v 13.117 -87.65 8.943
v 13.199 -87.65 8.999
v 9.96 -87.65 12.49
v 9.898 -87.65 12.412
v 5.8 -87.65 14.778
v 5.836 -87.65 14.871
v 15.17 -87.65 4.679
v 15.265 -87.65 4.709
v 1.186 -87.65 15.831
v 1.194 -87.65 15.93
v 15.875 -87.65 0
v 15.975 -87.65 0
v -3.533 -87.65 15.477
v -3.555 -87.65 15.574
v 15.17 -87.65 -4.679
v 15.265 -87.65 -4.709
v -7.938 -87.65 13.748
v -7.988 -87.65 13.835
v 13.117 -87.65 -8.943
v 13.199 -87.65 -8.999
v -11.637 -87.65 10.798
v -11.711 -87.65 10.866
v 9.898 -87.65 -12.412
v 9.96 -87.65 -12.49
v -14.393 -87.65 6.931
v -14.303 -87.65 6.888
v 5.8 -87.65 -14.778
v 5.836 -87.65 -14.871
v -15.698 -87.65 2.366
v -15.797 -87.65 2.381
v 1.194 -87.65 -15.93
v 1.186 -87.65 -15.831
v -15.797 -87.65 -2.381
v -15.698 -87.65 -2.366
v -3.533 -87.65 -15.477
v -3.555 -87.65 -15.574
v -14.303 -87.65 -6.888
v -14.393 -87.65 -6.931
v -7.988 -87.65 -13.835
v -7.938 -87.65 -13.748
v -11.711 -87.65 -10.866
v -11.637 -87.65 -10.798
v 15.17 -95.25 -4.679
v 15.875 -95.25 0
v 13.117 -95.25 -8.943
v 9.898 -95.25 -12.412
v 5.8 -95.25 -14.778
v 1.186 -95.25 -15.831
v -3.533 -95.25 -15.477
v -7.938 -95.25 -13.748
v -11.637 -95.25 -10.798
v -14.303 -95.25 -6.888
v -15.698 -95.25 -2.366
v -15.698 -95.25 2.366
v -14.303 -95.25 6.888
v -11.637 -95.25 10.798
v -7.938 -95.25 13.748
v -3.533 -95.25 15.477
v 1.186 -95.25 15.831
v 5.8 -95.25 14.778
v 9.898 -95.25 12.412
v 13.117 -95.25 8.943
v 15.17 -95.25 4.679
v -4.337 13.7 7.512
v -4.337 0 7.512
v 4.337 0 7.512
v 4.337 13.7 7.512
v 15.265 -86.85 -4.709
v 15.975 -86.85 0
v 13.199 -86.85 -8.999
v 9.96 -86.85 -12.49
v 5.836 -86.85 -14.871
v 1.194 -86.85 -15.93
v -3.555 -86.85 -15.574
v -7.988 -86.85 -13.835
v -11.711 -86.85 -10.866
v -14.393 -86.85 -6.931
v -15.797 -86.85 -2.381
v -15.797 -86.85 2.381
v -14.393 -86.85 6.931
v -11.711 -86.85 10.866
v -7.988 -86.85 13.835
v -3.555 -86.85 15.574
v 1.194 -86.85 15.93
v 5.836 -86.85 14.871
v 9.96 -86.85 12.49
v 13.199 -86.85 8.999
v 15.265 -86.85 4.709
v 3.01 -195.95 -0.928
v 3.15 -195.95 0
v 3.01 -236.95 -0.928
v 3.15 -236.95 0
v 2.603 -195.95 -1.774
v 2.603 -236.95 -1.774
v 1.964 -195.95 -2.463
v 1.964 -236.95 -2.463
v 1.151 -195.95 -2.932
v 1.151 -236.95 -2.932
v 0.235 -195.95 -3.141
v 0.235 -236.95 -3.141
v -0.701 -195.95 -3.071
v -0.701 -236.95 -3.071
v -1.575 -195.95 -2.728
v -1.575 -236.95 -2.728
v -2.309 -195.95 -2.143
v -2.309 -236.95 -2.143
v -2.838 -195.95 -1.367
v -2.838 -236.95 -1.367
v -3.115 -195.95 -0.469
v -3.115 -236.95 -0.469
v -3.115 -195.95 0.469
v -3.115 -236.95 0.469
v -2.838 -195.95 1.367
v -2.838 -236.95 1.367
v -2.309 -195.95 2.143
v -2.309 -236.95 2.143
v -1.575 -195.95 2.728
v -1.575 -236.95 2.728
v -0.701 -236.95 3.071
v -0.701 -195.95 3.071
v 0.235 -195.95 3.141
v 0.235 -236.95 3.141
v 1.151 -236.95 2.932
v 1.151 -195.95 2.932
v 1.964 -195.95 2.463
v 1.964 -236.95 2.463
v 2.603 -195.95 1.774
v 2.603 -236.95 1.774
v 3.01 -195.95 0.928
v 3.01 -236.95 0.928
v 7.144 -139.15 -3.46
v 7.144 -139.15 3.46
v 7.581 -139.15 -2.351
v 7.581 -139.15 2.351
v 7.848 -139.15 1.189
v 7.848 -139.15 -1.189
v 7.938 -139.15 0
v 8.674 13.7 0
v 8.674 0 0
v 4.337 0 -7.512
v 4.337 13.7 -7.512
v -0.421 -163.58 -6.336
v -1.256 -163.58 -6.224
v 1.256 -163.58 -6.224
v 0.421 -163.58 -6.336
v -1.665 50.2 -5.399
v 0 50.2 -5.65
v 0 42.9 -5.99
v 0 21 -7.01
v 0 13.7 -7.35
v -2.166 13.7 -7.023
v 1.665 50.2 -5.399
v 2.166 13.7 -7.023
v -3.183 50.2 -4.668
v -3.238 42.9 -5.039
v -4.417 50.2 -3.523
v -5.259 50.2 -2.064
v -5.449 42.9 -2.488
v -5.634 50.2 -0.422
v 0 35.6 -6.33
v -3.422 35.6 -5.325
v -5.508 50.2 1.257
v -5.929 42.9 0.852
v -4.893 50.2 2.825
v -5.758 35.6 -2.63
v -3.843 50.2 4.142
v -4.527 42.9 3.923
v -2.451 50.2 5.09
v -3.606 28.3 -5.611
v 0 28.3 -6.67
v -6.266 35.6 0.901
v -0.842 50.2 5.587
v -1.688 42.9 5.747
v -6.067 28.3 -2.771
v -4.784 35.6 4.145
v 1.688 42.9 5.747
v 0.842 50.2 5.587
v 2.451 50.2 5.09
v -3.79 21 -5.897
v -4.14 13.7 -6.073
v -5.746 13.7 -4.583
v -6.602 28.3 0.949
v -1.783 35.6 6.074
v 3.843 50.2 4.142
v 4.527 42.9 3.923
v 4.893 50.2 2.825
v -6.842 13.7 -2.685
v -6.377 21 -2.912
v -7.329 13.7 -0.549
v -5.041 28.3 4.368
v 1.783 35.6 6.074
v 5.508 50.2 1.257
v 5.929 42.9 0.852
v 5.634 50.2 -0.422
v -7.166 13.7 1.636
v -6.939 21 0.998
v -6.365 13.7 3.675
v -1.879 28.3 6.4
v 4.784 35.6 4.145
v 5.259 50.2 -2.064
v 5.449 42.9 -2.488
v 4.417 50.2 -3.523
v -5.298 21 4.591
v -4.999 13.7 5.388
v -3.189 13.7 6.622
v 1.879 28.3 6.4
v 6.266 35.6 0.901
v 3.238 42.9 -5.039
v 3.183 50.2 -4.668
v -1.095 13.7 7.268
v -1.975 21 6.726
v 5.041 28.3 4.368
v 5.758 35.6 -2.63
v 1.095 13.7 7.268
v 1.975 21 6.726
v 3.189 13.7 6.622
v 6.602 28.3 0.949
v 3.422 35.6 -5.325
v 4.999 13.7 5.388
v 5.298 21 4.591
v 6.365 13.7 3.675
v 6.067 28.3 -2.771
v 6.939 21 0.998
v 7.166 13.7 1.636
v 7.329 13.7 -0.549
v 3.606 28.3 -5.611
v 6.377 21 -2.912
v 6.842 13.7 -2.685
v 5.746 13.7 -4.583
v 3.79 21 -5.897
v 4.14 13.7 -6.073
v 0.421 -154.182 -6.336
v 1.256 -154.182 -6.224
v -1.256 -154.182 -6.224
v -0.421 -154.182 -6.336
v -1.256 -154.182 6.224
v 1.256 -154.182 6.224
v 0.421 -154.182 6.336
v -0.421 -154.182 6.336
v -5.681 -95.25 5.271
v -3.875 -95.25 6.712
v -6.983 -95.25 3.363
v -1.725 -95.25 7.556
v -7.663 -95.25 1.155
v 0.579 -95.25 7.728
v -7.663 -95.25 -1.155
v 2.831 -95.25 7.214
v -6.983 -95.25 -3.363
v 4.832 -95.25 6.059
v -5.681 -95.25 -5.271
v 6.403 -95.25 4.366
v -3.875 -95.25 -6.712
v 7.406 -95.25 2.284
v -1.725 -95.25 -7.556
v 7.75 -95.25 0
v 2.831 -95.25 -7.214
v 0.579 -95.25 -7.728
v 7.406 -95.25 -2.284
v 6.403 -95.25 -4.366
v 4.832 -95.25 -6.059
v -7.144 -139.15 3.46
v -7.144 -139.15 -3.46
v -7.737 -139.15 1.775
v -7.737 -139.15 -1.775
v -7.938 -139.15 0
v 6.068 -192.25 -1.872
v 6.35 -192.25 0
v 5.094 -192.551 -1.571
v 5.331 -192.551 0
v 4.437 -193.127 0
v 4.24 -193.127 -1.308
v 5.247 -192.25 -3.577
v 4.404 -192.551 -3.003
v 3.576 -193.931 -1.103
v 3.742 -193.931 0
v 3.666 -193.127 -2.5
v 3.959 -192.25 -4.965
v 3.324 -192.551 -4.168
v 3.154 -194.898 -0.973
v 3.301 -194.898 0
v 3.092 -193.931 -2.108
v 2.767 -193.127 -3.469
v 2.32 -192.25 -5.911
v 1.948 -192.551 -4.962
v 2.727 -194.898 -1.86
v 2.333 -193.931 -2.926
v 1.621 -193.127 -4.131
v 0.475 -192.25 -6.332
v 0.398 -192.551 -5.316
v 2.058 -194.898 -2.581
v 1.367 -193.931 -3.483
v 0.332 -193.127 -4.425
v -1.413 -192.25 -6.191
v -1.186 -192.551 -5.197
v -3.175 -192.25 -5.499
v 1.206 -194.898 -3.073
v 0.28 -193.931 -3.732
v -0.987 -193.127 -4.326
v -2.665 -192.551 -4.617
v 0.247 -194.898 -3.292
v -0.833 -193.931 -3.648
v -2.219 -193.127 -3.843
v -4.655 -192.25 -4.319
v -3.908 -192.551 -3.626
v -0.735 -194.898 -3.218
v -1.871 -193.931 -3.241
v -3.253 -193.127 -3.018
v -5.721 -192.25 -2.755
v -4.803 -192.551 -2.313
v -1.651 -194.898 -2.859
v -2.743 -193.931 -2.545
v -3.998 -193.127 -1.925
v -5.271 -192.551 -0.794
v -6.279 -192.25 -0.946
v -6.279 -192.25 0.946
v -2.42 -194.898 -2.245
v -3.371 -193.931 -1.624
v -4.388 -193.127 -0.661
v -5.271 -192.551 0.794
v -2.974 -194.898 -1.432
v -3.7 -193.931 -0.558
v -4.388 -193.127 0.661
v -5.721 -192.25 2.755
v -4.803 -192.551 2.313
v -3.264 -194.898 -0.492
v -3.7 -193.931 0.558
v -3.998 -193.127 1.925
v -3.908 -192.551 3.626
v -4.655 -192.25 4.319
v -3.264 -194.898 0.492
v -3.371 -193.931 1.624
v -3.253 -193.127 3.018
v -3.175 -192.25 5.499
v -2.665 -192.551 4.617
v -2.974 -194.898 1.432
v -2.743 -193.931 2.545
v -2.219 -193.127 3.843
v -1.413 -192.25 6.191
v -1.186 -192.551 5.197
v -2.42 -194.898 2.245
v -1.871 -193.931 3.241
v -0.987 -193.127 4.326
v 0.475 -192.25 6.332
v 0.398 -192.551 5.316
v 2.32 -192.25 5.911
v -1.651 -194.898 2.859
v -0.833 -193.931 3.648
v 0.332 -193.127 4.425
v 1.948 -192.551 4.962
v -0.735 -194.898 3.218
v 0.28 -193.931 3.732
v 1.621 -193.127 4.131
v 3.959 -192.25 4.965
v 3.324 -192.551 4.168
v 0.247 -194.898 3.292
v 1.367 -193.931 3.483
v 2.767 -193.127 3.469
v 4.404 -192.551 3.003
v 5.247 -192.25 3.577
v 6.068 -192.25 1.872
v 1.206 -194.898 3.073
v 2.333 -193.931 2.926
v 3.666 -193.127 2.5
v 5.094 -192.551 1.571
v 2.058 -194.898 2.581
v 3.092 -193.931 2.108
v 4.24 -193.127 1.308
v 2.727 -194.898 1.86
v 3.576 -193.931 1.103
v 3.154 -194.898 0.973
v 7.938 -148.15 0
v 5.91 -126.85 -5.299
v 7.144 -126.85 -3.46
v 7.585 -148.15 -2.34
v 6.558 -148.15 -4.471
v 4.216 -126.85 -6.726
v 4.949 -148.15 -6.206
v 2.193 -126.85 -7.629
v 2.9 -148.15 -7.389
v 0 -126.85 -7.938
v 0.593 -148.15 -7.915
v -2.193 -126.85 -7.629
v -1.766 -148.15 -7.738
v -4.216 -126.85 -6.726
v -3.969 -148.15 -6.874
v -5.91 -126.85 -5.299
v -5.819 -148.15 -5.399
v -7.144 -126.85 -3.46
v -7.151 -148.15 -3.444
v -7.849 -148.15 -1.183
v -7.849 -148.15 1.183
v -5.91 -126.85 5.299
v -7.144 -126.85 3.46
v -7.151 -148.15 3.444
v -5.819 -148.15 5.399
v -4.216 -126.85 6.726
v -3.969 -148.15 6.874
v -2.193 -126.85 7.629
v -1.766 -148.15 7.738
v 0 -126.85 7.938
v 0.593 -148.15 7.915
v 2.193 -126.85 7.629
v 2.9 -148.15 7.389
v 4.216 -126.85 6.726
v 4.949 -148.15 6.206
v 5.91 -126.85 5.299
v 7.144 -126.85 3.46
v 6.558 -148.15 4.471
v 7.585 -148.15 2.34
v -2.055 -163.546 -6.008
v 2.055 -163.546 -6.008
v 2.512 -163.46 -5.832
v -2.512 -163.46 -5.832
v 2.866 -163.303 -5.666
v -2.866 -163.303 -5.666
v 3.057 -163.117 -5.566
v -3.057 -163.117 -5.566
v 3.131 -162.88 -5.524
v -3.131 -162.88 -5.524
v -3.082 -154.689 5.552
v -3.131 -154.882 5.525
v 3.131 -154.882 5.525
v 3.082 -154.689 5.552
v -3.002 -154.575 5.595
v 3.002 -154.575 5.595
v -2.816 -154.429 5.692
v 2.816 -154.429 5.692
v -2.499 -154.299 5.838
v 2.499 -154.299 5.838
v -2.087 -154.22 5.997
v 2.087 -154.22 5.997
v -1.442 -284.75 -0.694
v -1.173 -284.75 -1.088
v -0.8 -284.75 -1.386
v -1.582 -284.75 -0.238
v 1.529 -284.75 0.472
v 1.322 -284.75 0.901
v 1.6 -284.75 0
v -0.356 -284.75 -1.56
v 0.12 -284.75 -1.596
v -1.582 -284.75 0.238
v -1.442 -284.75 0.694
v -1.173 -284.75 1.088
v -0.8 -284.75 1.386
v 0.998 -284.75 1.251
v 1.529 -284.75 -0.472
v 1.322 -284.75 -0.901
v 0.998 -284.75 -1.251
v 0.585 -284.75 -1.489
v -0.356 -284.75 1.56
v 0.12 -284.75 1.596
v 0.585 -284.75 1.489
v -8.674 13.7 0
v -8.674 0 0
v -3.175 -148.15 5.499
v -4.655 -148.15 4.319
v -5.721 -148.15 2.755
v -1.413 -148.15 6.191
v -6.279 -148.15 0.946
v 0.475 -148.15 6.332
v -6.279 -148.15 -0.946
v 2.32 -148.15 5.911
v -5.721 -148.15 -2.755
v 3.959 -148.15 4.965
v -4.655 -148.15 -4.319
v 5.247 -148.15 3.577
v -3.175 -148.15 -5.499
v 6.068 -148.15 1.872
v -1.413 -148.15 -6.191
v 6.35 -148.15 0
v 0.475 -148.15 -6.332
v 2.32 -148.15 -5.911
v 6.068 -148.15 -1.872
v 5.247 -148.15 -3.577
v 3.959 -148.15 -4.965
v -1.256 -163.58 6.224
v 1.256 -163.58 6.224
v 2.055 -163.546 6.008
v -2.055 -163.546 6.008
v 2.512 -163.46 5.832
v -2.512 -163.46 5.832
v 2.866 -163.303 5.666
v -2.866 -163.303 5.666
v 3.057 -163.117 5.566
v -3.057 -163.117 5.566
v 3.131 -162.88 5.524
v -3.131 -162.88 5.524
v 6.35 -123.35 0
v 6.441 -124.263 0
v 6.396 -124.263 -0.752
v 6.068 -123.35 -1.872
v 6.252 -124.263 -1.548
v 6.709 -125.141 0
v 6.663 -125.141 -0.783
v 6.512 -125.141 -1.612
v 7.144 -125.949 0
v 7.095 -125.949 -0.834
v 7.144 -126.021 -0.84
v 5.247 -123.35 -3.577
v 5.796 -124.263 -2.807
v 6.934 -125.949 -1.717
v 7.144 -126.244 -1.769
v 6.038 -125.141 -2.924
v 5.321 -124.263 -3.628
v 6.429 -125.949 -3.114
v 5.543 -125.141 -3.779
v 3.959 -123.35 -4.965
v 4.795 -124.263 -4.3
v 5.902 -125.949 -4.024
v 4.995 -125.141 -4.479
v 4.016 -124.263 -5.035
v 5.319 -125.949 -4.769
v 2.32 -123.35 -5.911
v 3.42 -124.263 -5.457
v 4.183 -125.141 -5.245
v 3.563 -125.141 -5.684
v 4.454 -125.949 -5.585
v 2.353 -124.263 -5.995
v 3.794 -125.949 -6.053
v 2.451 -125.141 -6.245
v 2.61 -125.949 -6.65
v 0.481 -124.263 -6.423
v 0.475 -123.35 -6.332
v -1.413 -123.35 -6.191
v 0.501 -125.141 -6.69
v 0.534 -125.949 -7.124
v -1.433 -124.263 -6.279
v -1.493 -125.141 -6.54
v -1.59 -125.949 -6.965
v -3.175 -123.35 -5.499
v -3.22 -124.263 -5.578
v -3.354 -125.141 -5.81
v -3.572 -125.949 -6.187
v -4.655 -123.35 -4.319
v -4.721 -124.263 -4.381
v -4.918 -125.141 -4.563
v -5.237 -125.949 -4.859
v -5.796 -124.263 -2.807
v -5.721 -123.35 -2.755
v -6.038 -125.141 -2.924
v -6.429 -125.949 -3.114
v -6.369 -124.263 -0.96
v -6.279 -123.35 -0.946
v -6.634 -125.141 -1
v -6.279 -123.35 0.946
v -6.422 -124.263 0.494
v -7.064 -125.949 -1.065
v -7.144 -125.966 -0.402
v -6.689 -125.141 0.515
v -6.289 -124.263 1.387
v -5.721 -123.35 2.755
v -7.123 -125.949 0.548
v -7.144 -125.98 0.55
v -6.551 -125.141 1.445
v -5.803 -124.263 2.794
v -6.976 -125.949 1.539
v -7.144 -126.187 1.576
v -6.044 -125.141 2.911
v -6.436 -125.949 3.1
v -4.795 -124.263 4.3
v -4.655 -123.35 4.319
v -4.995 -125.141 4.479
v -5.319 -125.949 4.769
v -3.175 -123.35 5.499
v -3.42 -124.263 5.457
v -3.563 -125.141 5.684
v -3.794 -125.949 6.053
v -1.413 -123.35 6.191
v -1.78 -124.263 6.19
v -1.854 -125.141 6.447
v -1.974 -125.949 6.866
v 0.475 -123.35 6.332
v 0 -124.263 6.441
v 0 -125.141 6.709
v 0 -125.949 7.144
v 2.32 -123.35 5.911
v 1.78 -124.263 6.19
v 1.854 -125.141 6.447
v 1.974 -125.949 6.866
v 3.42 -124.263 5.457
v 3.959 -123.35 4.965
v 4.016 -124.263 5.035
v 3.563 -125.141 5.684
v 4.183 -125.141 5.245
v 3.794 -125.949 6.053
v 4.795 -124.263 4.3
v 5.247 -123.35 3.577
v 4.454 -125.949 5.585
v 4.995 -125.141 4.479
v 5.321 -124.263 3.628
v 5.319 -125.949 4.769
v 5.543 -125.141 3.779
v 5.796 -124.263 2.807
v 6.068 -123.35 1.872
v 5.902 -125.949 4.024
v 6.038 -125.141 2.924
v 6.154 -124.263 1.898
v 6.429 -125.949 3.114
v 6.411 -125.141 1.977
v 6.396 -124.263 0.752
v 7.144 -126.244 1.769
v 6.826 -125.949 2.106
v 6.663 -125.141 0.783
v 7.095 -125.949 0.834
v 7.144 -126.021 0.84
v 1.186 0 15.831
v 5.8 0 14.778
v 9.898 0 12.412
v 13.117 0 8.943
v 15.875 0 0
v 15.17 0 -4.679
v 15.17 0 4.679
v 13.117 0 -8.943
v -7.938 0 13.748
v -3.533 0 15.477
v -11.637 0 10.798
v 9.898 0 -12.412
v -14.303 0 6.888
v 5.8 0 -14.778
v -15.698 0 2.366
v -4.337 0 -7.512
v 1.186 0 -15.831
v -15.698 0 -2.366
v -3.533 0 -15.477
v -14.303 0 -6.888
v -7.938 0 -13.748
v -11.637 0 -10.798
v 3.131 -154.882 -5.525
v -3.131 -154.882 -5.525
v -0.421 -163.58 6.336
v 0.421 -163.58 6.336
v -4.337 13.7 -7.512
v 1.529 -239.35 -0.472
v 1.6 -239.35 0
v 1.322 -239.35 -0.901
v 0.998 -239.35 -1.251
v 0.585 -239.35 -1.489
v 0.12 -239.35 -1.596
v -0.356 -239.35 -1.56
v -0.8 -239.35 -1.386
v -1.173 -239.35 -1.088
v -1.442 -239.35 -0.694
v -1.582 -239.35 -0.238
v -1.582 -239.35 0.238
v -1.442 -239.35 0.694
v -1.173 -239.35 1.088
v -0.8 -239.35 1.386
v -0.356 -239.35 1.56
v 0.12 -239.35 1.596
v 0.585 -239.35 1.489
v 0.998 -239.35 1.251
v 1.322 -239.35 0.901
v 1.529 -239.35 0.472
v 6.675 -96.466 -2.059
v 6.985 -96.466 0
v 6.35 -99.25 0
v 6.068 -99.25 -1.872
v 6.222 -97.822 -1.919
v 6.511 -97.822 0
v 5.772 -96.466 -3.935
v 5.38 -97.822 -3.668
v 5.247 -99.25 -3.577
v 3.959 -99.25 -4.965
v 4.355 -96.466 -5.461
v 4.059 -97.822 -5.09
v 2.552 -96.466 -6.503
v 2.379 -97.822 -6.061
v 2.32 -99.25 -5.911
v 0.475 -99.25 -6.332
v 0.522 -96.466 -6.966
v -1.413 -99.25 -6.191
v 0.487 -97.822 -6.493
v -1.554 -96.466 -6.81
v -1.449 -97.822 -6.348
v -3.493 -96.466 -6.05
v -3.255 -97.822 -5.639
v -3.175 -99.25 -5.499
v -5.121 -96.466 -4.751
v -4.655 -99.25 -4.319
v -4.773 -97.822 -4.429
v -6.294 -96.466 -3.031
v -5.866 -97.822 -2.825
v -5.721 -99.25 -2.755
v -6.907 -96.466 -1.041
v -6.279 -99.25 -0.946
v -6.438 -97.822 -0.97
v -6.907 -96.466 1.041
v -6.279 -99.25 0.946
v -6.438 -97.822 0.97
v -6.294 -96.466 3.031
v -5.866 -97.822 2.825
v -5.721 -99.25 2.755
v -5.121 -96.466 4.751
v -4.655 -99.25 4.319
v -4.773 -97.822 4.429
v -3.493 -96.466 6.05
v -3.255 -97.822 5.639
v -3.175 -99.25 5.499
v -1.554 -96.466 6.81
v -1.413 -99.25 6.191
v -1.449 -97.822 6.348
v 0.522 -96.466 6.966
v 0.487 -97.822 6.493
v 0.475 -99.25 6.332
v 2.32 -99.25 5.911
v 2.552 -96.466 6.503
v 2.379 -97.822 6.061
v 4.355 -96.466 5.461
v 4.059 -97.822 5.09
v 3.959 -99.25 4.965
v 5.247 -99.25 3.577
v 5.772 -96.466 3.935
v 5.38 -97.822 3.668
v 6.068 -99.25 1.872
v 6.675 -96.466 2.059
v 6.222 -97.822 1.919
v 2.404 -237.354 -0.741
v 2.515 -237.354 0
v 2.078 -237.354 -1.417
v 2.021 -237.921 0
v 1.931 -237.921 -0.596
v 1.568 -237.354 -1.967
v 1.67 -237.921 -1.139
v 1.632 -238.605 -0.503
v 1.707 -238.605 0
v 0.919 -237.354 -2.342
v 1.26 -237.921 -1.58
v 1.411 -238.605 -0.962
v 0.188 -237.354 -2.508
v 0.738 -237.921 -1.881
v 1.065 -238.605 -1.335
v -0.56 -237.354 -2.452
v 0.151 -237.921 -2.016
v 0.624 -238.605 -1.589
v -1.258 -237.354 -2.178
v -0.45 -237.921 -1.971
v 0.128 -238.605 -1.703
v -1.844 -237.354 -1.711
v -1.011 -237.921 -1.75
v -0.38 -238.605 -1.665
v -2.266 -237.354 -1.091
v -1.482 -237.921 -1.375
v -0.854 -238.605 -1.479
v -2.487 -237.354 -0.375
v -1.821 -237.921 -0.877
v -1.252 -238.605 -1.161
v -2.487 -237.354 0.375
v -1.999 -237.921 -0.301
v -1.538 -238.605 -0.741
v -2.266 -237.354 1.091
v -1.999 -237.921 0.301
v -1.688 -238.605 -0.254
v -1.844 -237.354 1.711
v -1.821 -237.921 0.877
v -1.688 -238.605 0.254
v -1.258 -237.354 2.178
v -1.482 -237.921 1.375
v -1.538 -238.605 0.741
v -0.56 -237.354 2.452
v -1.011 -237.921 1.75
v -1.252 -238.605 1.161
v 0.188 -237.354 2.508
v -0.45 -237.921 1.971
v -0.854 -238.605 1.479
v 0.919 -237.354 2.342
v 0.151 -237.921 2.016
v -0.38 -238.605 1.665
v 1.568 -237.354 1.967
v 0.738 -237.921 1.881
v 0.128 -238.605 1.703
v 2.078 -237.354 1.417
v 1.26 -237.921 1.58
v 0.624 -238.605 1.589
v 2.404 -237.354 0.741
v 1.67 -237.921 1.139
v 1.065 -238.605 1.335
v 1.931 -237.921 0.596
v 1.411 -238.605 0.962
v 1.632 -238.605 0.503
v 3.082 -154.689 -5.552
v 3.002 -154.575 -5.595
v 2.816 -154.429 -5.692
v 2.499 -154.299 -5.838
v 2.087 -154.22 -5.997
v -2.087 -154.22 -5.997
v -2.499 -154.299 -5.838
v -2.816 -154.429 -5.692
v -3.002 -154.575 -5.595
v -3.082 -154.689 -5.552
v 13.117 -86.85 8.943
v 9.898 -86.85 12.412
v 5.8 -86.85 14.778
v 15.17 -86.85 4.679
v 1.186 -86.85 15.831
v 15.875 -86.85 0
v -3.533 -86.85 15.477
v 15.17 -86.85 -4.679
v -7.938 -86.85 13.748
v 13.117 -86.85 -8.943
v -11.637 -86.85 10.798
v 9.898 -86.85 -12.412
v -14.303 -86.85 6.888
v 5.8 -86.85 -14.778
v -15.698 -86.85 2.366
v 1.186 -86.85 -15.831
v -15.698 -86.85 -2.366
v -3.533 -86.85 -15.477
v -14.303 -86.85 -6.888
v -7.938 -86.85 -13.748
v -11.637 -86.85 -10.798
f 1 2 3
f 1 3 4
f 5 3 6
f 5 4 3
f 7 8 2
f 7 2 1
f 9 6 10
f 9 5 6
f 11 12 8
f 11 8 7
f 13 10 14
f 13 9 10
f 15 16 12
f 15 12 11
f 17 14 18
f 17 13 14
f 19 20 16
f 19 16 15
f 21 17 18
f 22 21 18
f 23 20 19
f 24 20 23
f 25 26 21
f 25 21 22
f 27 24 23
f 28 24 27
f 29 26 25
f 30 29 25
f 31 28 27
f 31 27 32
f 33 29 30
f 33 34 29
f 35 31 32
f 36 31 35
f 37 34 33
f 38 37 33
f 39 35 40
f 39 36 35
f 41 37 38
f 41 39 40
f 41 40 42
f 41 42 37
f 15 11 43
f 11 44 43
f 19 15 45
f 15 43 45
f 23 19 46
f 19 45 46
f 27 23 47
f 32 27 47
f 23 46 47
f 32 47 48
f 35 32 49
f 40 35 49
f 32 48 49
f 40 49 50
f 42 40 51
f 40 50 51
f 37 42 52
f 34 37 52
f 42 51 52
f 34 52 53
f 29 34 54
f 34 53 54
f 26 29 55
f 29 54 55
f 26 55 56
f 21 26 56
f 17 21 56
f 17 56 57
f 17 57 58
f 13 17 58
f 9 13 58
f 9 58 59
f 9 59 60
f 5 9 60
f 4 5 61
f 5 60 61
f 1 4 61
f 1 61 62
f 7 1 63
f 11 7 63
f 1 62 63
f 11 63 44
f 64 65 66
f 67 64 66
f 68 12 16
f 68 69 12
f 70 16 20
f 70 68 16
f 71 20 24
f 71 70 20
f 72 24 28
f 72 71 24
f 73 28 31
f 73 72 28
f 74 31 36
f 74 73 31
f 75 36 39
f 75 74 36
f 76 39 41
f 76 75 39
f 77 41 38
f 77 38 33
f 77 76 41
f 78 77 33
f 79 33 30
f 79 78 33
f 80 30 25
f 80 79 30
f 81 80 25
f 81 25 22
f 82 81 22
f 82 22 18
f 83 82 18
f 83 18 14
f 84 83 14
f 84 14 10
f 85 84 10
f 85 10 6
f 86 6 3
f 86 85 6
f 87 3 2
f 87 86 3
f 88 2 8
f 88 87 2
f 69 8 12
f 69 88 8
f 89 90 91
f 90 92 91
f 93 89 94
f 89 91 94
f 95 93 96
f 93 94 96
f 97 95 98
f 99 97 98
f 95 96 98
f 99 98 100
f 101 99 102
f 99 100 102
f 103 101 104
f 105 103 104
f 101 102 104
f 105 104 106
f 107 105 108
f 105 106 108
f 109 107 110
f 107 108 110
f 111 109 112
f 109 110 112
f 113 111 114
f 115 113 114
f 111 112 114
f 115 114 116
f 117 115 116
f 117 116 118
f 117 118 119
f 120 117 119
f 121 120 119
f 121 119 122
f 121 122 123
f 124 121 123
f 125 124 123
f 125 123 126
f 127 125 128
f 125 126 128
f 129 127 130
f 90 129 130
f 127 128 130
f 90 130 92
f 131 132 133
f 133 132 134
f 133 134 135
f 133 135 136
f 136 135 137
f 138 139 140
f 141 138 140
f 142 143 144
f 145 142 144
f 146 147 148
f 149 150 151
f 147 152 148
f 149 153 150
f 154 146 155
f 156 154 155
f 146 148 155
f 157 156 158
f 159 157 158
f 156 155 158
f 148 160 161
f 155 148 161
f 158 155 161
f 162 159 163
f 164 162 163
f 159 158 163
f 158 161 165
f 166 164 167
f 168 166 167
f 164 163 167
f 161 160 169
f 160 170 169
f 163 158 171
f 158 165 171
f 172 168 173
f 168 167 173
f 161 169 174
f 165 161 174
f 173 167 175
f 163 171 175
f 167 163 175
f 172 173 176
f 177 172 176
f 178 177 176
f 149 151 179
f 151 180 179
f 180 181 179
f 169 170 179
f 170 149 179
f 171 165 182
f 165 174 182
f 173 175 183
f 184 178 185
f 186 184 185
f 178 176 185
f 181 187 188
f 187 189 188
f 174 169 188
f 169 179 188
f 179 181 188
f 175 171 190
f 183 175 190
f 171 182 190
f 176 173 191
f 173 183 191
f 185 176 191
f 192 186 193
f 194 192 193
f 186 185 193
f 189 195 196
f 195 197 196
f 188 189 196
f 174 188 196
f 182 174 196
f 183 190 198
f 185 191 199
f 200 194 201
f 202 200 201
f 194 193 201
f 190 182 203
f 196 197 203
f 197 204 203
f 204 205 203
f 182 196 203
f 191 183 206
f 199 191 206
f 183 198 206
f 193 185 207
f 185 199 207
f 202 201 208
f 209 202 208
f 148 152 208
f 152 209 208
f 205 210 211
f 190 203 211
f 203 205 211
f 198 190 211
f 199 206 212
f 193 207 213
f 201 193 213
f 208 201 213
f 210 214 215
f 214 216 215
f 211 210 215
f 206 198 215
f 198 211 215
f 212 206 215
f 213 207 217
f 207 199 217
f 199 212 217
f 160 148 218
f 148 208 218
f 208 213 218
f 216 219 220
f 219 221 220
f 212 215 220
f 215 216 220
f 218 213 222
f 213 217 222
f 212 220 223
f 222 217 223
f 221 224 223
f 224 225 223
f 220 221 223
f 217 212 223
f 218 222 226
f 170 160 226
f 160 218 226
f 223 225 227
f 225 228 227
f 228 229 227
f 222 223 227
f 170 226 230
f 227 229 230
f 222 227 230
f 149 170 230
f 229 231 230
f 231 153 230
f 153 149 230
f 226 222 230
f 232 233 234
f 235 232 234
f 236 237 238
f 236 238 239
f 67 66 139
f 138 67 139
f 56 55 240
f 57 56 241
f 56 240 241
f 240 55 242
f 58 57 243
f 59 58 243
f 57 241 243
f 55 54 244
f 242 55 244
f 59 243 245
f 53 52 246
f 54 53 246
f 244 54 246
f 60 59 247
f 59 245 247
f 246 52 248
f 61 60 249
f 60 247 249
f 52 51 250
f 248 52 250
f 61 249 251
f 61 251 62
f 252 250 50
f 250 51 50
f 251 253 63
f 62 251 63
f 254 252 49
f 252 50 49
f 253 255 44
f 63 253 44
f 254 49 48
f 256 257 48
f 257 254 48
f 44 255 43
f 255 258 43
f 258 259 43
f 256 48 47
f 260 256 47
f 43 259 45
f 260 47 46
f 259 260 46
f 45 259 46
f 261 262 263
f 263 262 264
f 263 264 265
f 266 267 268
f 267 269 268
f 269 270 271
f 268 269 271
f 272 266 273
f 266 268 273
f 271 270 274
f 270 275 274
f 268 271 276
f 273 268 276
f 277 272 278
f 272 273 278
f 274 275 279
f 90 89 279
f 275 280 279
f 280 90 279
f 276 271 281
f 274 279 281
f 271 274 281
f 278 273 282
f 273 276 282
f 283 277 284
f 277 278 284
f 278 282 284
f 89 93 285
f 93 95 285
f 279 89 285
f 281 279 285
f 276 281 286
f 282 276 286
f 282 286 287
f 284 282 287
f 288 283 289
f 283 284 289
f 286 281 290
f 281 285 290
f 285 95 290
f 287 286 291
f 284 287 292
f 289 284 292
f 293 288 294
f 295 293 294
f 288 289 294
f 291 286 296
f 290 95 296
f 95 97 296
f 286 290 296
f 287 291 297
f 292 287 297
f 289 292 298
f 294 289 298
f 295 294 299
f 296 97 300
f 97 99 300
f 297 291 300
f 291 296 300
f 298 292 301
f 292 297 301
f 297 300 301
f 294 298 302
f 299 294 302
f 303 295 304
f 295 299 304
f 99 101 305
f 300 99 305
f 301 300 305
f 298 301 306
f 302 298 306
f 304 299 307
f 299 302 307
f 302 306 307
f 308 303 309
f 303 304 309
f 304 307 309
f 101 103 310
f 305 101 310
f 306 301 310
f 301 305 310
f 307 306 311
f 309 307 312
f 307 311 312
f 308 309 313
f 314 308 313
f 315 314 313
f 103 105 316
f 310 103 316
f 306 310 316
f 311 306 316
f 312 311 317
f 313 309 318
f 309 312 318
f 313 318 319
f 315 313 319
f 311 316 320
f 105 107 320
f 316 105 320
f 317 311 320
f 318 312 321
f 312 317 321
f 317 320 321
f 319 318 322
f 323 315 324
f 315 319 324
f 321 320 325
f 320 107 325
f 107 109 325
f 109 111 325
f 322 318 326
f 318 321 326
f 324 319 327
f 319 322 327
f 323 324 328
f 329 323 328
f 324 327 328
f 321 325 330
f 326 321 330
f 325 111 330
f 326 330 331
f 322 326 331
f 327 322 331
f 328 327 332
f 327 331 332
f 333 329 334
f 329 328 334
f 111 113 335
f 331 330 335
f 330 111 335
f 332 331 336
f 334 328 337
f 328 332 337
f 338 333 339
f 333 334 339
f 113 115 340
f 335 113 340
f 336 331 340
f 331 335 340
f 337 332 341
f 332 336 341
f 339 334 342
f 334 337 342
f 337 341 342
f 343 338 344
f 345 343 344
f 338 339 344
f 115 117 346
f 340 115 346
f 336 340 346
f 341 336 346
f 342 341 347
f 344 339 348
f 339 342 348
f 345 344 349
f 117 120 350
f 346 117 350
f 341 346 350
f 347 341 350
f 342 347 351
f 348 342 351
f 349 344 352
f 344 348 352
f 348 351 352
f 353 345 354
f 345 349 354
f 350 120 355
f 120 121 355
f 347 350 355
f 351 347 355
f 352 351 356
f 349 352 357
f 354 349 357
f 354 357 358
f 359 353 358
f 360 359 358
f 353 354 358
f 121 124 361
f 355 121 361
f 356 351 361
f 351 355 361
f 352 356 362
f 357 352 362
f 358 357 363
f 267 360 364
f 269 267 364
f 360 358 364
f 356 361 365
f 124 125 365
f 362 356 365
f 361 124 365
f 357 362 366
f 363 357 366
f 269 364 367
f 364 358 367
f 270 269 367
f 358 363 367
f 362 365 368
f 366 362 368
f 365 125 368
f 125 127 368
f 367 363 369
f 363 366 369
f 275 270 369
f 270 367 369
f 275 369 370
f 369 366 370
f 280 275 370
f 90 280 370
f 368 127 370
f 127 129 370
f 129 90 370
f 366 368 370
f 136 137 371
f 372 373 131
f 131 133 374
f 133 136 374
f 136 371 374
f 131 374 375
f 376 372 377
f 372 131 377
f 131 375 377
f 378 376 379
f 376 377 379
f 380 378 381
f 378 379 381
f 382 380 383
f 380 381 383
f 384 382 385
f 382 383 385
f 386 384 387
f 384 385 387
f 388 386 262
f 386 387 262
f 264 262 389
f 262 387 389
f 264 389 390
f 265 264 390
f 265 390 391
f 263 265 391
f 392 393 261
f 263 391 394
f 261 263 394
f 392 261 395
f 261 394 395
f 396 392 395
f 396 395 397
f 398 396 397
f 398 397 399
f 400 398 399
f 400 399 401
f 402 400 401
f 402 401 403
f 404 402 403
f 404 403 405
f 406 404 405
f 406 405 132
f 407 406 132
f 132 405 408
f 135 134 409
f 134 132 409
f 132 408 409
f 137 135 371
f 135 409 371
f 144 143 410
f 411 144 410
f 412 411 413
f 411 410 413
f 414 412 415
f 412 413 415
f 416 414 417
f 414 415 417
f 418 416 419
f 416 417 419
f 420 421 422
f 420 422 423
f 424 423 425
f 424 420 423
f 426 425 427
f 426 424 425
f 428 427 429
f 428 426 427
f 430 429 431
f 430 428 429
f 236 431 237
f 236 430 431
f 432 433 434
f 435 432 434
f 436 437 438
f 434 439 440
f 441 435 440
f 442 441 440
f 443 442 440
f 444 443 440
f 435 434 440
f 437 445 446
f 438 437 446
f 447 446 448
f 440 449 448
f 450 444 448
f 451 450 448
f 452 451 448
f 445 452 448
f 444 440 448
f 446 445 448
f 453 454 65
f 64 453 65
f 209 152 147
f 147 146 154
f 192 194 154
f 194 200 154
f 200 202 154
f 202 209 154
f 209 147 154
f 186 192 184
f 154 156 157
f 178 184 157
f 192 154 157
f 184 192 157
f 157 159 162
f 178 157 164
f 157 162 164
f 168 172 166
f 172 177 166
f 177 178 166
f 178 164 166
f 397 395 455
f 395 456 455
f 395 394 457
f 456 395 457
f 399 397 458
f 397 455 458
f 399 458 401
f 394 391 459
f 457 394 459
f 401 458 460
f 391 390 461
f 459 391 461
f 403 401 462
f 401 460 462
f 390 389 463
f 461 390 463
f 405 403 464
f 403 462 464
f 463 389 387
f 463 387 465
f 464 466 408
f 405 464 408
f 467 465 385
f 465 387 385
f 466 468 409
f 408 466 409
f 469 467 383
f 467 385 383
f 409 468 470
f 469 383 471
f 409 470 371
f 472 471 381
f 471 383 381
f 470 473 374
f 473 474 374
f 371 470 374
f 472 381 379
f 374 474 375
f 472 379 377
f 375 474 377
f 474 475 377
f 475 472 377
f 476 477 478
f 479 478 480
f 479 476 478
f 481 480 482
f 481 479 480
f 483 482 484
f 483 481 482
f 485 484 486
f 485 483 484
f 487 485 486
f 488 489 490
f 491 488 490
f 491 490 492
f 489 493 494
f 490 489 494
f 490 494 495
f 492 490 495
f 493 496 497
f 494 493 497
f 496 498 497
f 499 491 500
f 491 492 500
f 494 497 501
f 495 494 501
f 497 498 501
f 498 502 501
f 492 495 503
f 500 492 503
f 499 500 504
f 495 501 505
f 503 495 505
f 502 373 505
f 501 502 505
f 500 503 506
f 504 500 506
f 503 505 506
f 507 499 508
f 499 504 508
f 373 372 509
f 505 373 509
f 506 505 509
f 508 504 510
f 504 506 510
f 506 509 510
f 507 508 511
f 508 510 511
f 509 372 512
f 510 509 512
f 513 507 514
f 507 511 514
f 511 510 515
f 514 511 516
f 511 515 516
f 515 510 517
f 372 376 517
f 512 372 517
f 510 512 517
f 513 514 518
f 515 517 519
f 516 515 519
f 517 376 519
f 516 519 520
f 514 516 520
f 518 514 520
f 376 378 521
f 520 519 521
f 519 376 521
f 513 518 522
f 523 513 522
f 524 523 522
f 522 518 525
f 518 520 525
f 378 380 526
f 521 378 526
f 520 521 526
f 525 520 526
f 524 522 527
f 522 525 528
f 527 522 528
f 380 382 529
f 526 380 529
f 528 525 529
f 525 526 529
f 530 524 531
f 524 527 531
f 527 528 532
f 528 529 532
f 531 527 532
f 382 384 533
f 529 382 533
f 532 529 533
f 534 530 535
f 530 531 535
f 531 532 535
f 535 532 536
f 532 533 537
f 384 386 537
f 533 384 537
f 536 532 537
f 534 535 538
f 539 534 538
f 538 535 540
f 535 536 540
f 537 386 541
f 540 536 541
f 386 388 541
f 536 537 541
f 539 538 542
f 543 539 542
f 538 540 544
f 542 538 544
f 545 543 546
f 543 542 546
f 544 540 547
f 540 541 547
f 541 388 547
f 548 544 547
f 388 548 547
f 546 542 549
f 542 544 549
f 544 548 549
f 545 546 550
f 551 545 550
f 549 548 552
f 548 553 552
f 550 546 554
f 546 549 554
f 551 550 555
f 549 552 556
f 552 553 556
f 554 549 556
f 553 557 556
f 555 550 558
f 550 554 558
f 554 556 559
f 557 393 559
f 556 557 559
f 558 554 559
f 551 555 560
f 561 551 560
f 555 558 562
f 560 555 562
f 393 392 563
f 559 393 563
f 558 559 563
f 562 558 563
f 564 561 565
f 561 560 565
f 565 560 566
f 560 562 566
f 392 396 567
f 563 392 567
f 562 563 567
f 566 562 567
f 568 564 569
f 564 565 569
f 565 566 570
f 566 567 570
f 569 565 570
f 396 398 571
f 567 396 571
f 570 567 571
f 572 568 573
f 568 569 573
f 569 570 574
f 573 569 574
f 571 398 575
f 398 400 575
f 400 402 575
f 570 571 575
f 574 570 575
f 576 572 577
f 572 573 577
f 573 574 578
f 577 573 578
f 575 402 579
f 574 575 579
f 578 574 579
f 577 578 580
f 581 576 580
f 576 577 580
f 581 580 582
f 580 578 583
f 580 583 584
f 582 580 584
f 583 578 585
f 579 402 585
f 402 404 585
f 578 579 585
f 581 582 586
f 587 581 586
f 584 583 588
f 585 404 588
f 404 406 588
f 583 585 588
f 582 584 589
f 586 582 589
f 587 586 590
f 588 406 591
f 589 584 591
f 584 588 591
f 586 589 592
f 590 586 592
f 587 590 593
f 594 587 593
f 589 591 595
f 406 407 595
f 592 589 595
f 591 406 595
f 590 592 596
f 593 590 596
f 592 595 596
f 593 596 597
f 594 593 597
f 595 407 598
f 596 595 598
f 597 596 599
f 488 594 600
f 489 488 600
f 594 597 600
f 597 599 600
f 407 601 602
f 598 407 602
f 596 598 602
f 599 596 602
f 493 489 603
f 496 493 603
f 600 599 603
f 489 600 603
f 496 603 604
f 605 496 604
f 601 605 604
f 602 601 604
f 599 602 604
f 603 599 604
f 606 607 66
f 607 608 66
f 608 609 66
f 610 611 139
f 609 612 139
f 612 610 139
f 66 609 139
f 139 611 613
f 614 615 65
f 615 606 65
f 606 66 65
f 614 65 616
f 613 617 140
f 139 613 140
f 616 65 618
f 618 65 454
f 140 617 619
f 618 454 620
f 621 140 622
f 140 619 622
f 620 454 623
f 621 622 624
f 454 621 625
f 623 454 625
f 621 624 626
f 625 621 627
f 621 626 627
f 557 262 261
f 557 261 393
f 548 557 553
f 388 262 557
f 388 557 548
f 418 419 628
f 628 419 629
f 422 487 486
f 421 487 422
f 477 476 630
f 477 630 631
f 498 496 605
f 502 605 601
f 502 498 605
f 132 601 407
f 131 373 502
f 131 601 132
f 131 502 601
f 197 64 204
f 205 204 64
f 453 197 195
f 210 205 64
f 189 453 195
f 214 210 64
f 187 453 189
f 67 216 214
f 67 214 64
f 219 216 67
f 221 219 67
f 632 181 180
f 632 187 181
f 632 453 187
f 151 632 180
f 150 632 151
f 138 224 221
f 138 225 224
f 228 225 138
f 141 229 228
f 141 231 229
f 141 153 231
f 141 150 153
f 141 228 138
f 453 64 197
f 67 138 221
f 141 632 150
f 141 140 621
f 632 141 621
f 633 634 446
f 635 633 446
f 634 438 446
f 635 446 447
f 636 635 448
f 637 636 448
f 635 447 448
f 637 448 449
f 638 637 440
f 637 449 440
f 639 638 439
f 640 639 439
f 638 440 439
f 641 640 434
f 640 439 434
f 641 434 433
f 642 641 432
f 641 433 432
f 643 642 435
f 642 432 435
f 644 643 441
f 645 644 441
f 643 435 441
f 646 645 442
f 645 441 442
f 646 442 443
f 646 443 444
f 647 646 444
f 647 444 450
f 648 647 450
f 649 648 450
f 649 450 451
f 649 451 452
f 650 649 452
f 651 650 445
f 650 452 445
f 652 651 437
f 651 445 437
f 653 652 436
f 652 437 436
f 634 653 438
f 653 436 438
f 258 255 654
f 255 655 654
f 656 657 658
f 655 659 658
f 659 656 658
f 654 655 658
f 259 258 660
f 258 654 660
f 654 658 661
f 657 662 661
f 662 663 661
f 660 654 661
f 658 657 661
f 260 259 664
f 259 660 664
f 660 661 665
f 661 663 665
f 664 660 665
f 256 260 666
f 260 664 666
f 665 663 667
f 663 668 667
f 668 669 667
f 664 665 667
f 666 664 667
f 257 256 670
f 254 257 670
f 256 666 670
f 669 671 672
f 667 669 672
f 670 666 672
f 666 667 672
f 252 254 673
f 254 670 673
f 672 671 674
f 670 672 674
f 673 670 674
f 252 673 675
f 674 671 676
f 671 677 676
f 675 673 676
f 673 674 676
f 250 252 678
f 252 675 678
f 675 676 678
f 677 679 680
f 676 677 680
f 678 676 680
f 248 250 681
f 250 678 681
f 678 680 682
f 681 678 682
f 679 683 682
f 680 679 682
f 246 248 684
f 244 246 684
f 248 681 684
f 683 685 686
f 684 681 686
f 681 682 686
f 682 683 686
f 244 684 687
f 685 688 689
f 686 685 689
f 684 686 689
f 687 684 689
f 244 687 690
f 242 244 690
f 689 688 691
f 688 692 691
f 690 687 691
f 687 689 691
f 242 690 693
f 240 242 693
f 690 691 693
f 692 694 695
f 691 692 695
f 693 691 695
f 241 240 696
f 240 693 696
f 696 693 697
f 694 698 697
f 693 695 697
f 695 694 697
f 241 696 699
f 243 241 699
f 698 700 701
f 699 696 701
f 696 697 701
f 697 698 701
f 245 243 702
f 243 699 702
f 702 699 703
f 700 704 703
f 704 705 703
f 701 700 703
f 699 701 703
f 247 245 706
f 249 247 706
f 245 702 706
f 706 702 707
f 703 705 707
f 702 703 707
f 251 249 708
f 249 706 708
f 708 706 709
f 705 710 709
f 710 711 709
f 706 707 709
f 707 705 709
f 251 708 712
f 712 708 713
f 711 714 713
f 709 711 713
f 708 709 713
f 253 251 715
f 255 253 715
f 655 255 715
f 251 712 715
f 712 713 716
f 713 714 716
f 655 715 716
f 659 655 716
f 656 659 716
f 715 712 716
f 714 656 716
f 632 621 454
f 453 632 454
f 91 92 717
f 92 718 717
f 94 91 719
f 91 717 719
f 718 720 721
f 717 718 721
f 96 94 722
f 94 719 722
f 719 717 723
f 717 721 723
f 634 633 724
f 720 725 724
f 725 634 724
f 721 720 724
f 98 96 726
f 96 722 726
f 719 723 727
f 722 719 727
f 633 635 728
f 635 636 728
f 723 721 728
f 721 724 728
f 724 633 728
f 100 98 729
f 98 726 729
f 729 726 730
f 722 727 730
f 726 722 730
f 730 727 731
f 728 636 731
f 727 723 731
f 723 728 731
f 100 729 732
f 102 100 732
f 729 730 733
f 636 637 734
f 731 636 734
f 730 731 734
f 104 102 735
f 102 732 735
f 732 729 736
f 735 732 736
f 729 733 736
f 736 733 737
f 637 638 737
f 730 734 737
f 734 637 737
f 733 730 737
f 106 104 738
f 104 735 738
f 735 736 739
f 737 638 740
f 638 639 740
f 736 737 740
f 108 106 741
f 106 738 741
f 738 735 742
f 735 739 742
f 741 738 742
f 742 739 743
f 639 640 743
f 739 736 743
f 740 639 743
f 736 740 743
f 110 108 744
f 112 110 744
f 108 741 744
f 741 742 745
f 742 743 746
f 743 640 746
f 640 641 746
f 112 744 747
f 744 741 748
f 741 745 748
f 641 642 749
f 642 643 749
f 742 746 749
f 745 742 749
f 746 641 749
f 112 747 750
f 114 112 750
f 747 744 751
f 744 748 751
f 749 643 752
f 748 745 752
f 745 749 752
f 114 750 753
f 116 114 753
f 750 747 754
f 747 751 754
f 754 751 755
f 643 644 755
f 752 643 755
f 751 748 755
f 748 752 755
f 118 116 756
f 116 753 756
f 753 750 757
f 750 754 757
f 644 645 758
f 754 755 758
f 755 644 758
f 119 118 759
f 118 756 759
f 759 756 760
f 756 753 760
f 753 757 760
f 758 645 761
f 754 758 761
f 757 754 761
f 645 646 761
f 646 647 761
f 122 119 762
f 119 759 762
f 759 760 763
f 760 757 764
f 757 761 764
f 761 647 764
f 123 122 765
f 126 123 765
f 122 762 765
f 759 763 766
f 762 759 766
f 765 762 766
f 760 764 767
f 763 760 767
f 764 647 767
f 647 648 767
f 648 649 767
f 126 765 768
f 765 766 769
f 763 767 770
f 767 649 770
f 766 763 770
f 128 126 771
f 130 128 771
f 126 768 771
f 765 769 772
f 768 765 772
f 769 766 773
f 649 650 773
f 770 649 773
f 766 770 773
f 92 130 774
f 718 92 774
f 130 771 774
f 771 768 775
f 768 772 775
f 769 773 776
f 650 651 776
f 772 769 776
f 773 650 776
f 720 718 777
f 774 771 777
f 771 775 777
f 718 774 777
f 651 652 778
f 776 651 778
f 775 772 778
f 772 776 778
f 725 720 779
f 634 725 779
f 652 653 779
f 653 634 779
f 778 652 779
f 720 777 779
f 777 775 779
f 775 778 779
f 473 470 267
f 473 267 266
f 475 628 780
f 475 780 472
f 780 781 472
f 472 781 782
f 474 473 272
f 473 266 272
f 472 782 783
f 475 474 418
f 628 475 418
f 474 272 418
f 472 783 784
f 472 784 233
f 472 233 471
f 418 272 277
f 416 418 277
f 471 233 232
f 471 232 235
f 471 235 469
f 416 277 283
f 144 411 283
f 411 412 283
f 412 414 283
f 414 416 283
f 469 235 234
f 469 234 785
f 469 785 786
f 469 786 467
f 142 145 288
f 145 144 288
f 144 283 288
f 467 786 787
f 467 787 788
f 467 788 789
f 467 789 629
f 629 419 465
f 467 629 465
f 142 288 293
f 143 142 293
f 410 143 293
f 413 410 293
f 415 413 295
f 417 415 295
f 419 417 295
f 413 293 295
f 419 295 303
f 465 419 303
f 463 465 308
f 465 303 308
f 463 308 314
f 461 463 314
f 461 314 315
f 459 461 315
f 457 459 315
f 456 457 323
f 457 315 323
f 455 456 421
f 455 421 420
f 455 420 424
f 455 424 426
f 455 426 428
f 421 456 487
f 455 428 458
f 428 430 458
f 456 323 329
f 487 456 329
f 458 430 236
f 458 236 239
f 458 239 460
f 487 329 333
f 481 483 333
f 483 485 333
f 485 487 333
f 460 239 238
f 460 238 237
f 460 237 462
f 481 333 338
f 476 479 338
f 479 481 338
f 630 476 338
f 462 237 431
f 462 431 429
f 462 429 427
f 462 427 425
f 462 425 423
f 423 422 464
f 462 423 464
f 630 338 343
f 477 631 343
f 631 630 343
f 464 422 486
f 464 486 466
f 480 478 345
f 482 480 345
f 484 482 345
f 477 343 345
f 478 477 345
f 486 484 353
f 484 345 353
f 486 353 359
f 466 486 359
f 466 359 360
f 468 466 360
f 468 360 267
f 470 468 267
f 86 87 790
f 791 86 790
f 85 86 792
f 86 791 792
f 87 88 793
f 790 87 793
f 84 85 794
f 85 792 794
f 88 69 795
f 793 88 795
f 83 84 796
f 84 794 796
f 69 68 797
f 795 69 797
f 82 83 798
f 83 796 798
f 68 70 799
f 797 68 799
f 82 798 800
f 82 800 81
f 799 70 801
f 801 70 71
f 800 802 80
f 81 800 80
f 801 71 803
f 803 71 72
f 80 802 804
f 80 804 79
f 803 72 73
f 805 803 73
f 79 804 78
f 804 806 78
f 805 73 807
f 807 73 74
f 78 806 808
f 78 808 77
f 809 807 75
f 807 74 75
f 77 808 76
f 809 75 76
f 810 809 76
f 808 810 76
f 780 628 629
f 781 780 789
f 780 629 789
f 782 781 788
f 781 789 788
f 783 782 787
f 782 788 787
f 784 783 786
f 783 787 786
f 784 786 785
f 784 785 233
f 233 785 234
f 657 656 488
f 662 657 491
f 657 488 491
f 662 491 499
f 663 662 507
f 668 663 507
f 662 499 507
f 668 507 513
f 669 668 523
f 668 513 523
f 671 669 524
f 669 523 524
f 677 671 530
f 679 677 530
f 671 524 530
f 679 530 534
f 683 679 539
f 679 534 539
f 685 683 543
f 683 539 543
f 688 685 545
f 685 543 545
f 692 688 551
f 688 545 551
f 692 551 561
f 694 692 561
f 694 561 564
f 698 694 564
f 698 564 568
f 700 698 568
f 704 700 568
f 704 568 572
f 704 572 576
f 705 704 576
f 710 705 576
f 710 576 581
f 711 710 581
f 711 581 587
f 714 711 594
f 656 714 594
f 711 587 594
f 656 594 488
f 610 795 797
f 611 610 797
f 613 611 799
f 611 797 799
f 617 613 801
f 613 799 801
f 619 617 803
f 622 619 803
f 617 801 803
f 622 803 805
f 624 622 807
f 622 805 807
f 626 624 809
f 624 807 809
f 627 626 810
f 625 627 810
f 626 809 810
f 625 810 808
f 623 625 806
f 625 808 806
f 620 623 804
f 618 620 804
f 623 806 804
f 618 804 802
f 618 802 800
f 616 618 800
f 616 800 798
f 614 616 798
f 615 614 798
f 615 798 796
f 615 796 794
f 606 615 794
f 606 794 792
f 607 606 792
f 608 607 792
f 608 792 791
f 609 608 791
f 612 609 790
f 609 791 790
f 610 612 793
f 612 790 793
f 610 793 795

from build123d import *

# Parameters (mm, degrees)
CUT_EXTRUDE1_DEPTH      = 286.633670547
CUT_EXTRUDE1_DEPTH_BACK = 286.633670547
CUT_EXTRUDE2_DEPTH      = 286.633670547
CUT_EXTRUDE2_DEPTH_BACK = 286.633670547
BOSS_EXTRUDE1_DEPTH     = 13.7
SKETCH7_W               = 0.1
SKETCH7_H               = 0.8


with BuildPart() as part:
    # Sketch1 → Revolve1 (revolve)
    with BuildSketch(Plane.XY):
        with BuildLine():
            Line((0, 0), (15.875, 0))
            Line((15.875, 0), (15.875, -95.25))
            Line((15.875, -95.25), (7.75, -95.25))
            ThreePointArc((7.75, -95.25), (6.710108543, -97.13103799), (6.35, -99.25))
            Line((6.35, -99.25), (6.35, -123.35))
            ThreePointArc((6.35, -123.35), (6.765423592, -125.271598049), (7.9375, -126.85))
            Line((7.9375, -126.85), (7.9375, -148.15))
            Line((7.9375, -148.15), (6.35, -148.15))
            Line((6.35, -148.15), (6.35, -192.25))
            ThreePointArc((6.35, -192.25), (4.060973326, -193.504085038), (3.15, -195.95))
            Line((3.15, -195.95), (3.15, -236.95))
            ThreePointArc((3.15, -236.95), (2.021186638, -237.921495537), (1.6, -239.35))
            Line((1.6, -239.35), (1.6, -284.75))
            Line((1.6, -284.75), (0, -284.75))
            Line((0, -284.75), (0, 0))
        make_face()
    revolve(axis=Axis((0, -284.75, 0), (0, 1, 0)))

    # Sketch3 → Cut-Extrude1 (cut, two sides: drawn at the far end of the back side and taken through both)
    with BuildSketch(Plane.XY.offset(-CUT_EXTRUDE1_DEPTH_BACK)):
        with BuildLine():
            Line((7.9375, -139.15), (7.9375, -126.85))
            ThreePointArc((7.9375, -126.85), (7.511434792, -126.425239776), (7.14375, -125.949045798))
            Line((7.14375, -125.949045798), (7.14375, -139.15))
            Line((7.14375, -139.15), (7.9375, -139.15))
        make_face()
        with BuildLine():
            Line((-7.14375, -139.15), (-7.14375, -125.949045798))
            ThreePointArc((-7.14375, -125.949045798), (-7.511434792, -126.425239776), (-7.9375, -126.85))
            Line((-7.9375, -126.85), (-7.9375, -139.15))
            Line((-7.9375, -139.15), (-7.14375, -139.15))
        make_face()
    extrude(amount=CUT_EXTRUDE1_DEPTH + CUT_EXTRUDE1_DEPTH_BACK, mode=Mode.SUBTRACT)

    # Sketch4 → Cut-Extrude2 (cut, two sides: drawn at the far end of the back side and taken through both)
    with BuildSketch(Plane(origin=(0, 0, 0), x_dir=(0, 0, -1), z_dir=(1, 0, 0)).offset(-CUT_EXTRUDE2_DEPTH_BACK)):
        with BuildLine():
            Line((6.35, -163.5805), (6.2245, -163.5805))
            ThreePointArc((6.2245, -163.5805), (5.729525253, -163.375474747), (5.5245, -162.8805))
            Line((5.5245, -162.8805), (5.5245, -154.8825))
            ThreePointArc((5.5245, -154.8825), (5.729525253, -154.387525253), (6.2245, -154.1825))
            Line((6.2245, -154.1825), (6.35, -154.1825))
            Line((6.35, -154.1825), (6.35, -163.5805))
        make_face()
        with BuildLine():
            Line((-5.5245, -162.8805), (-5.5245, -154.8825))
            ThreePointArc((-5.5245, -154.8825), (-5.729525253, -154.387525253), (-6.2245, -154.1825))
            Line((-6.2245, -154.1825), (-6.35, -154.1825))
            Line((-6.35, -154.1825), (-6.35, -163.5805))
            Line((-6.35, -163.5805), (-6.2245, -163.5805))
            ThreePointArc((-6.2245, -163.5805), (-5.729525253, -163.375474747), (-5.5245, -162.8805))
        make_face()
    extrude(amount=CUT_EXTRUDE2_DEPTH + CUT_EXTRUDE2_DEPTH_BACK, mode=Mode.SUBTRACT)

    # Sketch5 → Boss-Extrude1 (add)
    with BuildSketch(Plane(origin=(0, 0, 0), x_dir=(1, 0, 0), z_dir=(0, 1, 0))):
        Polygon((-4.33708409, 7.51205), (-8.674168179, 0), (-4.33708409, -7.51205), (4.33708409, -7.51205), (8.674168179, 0), (4.33708409, 7.51205), align=None)
    extrude(amount=BOSS_EXTRUDE1_DEPTH)

    # Sketch6 → Revolve2 (revolve)
    with BuildSketch(Plane.XY, mode=Mode.PRIVATE) as revolve2_sk:
        Polygon((7.35, 13.7), (0, 13.7), (0, 50.2), (5.65, 50.2), align=None)
    revolve(revolve2_sk.sketch.rotate(Axis((0, 13.7, 0), (0, 1, 0)), 90), axis=Axis((0, 13.7, 0), (0, 1, 0)))

    # Sketch7 → Dont Clamp Below (revolve)
    with BuildSketch(Plane.XY):
        with Locations((15.925, -87.25)):
            Rectangle(SKETCH7_W, SKETCH7_H)
    revolve(axis=Axis((0, -284.75, 0), (0, 1, 0)))


solid = part.part
